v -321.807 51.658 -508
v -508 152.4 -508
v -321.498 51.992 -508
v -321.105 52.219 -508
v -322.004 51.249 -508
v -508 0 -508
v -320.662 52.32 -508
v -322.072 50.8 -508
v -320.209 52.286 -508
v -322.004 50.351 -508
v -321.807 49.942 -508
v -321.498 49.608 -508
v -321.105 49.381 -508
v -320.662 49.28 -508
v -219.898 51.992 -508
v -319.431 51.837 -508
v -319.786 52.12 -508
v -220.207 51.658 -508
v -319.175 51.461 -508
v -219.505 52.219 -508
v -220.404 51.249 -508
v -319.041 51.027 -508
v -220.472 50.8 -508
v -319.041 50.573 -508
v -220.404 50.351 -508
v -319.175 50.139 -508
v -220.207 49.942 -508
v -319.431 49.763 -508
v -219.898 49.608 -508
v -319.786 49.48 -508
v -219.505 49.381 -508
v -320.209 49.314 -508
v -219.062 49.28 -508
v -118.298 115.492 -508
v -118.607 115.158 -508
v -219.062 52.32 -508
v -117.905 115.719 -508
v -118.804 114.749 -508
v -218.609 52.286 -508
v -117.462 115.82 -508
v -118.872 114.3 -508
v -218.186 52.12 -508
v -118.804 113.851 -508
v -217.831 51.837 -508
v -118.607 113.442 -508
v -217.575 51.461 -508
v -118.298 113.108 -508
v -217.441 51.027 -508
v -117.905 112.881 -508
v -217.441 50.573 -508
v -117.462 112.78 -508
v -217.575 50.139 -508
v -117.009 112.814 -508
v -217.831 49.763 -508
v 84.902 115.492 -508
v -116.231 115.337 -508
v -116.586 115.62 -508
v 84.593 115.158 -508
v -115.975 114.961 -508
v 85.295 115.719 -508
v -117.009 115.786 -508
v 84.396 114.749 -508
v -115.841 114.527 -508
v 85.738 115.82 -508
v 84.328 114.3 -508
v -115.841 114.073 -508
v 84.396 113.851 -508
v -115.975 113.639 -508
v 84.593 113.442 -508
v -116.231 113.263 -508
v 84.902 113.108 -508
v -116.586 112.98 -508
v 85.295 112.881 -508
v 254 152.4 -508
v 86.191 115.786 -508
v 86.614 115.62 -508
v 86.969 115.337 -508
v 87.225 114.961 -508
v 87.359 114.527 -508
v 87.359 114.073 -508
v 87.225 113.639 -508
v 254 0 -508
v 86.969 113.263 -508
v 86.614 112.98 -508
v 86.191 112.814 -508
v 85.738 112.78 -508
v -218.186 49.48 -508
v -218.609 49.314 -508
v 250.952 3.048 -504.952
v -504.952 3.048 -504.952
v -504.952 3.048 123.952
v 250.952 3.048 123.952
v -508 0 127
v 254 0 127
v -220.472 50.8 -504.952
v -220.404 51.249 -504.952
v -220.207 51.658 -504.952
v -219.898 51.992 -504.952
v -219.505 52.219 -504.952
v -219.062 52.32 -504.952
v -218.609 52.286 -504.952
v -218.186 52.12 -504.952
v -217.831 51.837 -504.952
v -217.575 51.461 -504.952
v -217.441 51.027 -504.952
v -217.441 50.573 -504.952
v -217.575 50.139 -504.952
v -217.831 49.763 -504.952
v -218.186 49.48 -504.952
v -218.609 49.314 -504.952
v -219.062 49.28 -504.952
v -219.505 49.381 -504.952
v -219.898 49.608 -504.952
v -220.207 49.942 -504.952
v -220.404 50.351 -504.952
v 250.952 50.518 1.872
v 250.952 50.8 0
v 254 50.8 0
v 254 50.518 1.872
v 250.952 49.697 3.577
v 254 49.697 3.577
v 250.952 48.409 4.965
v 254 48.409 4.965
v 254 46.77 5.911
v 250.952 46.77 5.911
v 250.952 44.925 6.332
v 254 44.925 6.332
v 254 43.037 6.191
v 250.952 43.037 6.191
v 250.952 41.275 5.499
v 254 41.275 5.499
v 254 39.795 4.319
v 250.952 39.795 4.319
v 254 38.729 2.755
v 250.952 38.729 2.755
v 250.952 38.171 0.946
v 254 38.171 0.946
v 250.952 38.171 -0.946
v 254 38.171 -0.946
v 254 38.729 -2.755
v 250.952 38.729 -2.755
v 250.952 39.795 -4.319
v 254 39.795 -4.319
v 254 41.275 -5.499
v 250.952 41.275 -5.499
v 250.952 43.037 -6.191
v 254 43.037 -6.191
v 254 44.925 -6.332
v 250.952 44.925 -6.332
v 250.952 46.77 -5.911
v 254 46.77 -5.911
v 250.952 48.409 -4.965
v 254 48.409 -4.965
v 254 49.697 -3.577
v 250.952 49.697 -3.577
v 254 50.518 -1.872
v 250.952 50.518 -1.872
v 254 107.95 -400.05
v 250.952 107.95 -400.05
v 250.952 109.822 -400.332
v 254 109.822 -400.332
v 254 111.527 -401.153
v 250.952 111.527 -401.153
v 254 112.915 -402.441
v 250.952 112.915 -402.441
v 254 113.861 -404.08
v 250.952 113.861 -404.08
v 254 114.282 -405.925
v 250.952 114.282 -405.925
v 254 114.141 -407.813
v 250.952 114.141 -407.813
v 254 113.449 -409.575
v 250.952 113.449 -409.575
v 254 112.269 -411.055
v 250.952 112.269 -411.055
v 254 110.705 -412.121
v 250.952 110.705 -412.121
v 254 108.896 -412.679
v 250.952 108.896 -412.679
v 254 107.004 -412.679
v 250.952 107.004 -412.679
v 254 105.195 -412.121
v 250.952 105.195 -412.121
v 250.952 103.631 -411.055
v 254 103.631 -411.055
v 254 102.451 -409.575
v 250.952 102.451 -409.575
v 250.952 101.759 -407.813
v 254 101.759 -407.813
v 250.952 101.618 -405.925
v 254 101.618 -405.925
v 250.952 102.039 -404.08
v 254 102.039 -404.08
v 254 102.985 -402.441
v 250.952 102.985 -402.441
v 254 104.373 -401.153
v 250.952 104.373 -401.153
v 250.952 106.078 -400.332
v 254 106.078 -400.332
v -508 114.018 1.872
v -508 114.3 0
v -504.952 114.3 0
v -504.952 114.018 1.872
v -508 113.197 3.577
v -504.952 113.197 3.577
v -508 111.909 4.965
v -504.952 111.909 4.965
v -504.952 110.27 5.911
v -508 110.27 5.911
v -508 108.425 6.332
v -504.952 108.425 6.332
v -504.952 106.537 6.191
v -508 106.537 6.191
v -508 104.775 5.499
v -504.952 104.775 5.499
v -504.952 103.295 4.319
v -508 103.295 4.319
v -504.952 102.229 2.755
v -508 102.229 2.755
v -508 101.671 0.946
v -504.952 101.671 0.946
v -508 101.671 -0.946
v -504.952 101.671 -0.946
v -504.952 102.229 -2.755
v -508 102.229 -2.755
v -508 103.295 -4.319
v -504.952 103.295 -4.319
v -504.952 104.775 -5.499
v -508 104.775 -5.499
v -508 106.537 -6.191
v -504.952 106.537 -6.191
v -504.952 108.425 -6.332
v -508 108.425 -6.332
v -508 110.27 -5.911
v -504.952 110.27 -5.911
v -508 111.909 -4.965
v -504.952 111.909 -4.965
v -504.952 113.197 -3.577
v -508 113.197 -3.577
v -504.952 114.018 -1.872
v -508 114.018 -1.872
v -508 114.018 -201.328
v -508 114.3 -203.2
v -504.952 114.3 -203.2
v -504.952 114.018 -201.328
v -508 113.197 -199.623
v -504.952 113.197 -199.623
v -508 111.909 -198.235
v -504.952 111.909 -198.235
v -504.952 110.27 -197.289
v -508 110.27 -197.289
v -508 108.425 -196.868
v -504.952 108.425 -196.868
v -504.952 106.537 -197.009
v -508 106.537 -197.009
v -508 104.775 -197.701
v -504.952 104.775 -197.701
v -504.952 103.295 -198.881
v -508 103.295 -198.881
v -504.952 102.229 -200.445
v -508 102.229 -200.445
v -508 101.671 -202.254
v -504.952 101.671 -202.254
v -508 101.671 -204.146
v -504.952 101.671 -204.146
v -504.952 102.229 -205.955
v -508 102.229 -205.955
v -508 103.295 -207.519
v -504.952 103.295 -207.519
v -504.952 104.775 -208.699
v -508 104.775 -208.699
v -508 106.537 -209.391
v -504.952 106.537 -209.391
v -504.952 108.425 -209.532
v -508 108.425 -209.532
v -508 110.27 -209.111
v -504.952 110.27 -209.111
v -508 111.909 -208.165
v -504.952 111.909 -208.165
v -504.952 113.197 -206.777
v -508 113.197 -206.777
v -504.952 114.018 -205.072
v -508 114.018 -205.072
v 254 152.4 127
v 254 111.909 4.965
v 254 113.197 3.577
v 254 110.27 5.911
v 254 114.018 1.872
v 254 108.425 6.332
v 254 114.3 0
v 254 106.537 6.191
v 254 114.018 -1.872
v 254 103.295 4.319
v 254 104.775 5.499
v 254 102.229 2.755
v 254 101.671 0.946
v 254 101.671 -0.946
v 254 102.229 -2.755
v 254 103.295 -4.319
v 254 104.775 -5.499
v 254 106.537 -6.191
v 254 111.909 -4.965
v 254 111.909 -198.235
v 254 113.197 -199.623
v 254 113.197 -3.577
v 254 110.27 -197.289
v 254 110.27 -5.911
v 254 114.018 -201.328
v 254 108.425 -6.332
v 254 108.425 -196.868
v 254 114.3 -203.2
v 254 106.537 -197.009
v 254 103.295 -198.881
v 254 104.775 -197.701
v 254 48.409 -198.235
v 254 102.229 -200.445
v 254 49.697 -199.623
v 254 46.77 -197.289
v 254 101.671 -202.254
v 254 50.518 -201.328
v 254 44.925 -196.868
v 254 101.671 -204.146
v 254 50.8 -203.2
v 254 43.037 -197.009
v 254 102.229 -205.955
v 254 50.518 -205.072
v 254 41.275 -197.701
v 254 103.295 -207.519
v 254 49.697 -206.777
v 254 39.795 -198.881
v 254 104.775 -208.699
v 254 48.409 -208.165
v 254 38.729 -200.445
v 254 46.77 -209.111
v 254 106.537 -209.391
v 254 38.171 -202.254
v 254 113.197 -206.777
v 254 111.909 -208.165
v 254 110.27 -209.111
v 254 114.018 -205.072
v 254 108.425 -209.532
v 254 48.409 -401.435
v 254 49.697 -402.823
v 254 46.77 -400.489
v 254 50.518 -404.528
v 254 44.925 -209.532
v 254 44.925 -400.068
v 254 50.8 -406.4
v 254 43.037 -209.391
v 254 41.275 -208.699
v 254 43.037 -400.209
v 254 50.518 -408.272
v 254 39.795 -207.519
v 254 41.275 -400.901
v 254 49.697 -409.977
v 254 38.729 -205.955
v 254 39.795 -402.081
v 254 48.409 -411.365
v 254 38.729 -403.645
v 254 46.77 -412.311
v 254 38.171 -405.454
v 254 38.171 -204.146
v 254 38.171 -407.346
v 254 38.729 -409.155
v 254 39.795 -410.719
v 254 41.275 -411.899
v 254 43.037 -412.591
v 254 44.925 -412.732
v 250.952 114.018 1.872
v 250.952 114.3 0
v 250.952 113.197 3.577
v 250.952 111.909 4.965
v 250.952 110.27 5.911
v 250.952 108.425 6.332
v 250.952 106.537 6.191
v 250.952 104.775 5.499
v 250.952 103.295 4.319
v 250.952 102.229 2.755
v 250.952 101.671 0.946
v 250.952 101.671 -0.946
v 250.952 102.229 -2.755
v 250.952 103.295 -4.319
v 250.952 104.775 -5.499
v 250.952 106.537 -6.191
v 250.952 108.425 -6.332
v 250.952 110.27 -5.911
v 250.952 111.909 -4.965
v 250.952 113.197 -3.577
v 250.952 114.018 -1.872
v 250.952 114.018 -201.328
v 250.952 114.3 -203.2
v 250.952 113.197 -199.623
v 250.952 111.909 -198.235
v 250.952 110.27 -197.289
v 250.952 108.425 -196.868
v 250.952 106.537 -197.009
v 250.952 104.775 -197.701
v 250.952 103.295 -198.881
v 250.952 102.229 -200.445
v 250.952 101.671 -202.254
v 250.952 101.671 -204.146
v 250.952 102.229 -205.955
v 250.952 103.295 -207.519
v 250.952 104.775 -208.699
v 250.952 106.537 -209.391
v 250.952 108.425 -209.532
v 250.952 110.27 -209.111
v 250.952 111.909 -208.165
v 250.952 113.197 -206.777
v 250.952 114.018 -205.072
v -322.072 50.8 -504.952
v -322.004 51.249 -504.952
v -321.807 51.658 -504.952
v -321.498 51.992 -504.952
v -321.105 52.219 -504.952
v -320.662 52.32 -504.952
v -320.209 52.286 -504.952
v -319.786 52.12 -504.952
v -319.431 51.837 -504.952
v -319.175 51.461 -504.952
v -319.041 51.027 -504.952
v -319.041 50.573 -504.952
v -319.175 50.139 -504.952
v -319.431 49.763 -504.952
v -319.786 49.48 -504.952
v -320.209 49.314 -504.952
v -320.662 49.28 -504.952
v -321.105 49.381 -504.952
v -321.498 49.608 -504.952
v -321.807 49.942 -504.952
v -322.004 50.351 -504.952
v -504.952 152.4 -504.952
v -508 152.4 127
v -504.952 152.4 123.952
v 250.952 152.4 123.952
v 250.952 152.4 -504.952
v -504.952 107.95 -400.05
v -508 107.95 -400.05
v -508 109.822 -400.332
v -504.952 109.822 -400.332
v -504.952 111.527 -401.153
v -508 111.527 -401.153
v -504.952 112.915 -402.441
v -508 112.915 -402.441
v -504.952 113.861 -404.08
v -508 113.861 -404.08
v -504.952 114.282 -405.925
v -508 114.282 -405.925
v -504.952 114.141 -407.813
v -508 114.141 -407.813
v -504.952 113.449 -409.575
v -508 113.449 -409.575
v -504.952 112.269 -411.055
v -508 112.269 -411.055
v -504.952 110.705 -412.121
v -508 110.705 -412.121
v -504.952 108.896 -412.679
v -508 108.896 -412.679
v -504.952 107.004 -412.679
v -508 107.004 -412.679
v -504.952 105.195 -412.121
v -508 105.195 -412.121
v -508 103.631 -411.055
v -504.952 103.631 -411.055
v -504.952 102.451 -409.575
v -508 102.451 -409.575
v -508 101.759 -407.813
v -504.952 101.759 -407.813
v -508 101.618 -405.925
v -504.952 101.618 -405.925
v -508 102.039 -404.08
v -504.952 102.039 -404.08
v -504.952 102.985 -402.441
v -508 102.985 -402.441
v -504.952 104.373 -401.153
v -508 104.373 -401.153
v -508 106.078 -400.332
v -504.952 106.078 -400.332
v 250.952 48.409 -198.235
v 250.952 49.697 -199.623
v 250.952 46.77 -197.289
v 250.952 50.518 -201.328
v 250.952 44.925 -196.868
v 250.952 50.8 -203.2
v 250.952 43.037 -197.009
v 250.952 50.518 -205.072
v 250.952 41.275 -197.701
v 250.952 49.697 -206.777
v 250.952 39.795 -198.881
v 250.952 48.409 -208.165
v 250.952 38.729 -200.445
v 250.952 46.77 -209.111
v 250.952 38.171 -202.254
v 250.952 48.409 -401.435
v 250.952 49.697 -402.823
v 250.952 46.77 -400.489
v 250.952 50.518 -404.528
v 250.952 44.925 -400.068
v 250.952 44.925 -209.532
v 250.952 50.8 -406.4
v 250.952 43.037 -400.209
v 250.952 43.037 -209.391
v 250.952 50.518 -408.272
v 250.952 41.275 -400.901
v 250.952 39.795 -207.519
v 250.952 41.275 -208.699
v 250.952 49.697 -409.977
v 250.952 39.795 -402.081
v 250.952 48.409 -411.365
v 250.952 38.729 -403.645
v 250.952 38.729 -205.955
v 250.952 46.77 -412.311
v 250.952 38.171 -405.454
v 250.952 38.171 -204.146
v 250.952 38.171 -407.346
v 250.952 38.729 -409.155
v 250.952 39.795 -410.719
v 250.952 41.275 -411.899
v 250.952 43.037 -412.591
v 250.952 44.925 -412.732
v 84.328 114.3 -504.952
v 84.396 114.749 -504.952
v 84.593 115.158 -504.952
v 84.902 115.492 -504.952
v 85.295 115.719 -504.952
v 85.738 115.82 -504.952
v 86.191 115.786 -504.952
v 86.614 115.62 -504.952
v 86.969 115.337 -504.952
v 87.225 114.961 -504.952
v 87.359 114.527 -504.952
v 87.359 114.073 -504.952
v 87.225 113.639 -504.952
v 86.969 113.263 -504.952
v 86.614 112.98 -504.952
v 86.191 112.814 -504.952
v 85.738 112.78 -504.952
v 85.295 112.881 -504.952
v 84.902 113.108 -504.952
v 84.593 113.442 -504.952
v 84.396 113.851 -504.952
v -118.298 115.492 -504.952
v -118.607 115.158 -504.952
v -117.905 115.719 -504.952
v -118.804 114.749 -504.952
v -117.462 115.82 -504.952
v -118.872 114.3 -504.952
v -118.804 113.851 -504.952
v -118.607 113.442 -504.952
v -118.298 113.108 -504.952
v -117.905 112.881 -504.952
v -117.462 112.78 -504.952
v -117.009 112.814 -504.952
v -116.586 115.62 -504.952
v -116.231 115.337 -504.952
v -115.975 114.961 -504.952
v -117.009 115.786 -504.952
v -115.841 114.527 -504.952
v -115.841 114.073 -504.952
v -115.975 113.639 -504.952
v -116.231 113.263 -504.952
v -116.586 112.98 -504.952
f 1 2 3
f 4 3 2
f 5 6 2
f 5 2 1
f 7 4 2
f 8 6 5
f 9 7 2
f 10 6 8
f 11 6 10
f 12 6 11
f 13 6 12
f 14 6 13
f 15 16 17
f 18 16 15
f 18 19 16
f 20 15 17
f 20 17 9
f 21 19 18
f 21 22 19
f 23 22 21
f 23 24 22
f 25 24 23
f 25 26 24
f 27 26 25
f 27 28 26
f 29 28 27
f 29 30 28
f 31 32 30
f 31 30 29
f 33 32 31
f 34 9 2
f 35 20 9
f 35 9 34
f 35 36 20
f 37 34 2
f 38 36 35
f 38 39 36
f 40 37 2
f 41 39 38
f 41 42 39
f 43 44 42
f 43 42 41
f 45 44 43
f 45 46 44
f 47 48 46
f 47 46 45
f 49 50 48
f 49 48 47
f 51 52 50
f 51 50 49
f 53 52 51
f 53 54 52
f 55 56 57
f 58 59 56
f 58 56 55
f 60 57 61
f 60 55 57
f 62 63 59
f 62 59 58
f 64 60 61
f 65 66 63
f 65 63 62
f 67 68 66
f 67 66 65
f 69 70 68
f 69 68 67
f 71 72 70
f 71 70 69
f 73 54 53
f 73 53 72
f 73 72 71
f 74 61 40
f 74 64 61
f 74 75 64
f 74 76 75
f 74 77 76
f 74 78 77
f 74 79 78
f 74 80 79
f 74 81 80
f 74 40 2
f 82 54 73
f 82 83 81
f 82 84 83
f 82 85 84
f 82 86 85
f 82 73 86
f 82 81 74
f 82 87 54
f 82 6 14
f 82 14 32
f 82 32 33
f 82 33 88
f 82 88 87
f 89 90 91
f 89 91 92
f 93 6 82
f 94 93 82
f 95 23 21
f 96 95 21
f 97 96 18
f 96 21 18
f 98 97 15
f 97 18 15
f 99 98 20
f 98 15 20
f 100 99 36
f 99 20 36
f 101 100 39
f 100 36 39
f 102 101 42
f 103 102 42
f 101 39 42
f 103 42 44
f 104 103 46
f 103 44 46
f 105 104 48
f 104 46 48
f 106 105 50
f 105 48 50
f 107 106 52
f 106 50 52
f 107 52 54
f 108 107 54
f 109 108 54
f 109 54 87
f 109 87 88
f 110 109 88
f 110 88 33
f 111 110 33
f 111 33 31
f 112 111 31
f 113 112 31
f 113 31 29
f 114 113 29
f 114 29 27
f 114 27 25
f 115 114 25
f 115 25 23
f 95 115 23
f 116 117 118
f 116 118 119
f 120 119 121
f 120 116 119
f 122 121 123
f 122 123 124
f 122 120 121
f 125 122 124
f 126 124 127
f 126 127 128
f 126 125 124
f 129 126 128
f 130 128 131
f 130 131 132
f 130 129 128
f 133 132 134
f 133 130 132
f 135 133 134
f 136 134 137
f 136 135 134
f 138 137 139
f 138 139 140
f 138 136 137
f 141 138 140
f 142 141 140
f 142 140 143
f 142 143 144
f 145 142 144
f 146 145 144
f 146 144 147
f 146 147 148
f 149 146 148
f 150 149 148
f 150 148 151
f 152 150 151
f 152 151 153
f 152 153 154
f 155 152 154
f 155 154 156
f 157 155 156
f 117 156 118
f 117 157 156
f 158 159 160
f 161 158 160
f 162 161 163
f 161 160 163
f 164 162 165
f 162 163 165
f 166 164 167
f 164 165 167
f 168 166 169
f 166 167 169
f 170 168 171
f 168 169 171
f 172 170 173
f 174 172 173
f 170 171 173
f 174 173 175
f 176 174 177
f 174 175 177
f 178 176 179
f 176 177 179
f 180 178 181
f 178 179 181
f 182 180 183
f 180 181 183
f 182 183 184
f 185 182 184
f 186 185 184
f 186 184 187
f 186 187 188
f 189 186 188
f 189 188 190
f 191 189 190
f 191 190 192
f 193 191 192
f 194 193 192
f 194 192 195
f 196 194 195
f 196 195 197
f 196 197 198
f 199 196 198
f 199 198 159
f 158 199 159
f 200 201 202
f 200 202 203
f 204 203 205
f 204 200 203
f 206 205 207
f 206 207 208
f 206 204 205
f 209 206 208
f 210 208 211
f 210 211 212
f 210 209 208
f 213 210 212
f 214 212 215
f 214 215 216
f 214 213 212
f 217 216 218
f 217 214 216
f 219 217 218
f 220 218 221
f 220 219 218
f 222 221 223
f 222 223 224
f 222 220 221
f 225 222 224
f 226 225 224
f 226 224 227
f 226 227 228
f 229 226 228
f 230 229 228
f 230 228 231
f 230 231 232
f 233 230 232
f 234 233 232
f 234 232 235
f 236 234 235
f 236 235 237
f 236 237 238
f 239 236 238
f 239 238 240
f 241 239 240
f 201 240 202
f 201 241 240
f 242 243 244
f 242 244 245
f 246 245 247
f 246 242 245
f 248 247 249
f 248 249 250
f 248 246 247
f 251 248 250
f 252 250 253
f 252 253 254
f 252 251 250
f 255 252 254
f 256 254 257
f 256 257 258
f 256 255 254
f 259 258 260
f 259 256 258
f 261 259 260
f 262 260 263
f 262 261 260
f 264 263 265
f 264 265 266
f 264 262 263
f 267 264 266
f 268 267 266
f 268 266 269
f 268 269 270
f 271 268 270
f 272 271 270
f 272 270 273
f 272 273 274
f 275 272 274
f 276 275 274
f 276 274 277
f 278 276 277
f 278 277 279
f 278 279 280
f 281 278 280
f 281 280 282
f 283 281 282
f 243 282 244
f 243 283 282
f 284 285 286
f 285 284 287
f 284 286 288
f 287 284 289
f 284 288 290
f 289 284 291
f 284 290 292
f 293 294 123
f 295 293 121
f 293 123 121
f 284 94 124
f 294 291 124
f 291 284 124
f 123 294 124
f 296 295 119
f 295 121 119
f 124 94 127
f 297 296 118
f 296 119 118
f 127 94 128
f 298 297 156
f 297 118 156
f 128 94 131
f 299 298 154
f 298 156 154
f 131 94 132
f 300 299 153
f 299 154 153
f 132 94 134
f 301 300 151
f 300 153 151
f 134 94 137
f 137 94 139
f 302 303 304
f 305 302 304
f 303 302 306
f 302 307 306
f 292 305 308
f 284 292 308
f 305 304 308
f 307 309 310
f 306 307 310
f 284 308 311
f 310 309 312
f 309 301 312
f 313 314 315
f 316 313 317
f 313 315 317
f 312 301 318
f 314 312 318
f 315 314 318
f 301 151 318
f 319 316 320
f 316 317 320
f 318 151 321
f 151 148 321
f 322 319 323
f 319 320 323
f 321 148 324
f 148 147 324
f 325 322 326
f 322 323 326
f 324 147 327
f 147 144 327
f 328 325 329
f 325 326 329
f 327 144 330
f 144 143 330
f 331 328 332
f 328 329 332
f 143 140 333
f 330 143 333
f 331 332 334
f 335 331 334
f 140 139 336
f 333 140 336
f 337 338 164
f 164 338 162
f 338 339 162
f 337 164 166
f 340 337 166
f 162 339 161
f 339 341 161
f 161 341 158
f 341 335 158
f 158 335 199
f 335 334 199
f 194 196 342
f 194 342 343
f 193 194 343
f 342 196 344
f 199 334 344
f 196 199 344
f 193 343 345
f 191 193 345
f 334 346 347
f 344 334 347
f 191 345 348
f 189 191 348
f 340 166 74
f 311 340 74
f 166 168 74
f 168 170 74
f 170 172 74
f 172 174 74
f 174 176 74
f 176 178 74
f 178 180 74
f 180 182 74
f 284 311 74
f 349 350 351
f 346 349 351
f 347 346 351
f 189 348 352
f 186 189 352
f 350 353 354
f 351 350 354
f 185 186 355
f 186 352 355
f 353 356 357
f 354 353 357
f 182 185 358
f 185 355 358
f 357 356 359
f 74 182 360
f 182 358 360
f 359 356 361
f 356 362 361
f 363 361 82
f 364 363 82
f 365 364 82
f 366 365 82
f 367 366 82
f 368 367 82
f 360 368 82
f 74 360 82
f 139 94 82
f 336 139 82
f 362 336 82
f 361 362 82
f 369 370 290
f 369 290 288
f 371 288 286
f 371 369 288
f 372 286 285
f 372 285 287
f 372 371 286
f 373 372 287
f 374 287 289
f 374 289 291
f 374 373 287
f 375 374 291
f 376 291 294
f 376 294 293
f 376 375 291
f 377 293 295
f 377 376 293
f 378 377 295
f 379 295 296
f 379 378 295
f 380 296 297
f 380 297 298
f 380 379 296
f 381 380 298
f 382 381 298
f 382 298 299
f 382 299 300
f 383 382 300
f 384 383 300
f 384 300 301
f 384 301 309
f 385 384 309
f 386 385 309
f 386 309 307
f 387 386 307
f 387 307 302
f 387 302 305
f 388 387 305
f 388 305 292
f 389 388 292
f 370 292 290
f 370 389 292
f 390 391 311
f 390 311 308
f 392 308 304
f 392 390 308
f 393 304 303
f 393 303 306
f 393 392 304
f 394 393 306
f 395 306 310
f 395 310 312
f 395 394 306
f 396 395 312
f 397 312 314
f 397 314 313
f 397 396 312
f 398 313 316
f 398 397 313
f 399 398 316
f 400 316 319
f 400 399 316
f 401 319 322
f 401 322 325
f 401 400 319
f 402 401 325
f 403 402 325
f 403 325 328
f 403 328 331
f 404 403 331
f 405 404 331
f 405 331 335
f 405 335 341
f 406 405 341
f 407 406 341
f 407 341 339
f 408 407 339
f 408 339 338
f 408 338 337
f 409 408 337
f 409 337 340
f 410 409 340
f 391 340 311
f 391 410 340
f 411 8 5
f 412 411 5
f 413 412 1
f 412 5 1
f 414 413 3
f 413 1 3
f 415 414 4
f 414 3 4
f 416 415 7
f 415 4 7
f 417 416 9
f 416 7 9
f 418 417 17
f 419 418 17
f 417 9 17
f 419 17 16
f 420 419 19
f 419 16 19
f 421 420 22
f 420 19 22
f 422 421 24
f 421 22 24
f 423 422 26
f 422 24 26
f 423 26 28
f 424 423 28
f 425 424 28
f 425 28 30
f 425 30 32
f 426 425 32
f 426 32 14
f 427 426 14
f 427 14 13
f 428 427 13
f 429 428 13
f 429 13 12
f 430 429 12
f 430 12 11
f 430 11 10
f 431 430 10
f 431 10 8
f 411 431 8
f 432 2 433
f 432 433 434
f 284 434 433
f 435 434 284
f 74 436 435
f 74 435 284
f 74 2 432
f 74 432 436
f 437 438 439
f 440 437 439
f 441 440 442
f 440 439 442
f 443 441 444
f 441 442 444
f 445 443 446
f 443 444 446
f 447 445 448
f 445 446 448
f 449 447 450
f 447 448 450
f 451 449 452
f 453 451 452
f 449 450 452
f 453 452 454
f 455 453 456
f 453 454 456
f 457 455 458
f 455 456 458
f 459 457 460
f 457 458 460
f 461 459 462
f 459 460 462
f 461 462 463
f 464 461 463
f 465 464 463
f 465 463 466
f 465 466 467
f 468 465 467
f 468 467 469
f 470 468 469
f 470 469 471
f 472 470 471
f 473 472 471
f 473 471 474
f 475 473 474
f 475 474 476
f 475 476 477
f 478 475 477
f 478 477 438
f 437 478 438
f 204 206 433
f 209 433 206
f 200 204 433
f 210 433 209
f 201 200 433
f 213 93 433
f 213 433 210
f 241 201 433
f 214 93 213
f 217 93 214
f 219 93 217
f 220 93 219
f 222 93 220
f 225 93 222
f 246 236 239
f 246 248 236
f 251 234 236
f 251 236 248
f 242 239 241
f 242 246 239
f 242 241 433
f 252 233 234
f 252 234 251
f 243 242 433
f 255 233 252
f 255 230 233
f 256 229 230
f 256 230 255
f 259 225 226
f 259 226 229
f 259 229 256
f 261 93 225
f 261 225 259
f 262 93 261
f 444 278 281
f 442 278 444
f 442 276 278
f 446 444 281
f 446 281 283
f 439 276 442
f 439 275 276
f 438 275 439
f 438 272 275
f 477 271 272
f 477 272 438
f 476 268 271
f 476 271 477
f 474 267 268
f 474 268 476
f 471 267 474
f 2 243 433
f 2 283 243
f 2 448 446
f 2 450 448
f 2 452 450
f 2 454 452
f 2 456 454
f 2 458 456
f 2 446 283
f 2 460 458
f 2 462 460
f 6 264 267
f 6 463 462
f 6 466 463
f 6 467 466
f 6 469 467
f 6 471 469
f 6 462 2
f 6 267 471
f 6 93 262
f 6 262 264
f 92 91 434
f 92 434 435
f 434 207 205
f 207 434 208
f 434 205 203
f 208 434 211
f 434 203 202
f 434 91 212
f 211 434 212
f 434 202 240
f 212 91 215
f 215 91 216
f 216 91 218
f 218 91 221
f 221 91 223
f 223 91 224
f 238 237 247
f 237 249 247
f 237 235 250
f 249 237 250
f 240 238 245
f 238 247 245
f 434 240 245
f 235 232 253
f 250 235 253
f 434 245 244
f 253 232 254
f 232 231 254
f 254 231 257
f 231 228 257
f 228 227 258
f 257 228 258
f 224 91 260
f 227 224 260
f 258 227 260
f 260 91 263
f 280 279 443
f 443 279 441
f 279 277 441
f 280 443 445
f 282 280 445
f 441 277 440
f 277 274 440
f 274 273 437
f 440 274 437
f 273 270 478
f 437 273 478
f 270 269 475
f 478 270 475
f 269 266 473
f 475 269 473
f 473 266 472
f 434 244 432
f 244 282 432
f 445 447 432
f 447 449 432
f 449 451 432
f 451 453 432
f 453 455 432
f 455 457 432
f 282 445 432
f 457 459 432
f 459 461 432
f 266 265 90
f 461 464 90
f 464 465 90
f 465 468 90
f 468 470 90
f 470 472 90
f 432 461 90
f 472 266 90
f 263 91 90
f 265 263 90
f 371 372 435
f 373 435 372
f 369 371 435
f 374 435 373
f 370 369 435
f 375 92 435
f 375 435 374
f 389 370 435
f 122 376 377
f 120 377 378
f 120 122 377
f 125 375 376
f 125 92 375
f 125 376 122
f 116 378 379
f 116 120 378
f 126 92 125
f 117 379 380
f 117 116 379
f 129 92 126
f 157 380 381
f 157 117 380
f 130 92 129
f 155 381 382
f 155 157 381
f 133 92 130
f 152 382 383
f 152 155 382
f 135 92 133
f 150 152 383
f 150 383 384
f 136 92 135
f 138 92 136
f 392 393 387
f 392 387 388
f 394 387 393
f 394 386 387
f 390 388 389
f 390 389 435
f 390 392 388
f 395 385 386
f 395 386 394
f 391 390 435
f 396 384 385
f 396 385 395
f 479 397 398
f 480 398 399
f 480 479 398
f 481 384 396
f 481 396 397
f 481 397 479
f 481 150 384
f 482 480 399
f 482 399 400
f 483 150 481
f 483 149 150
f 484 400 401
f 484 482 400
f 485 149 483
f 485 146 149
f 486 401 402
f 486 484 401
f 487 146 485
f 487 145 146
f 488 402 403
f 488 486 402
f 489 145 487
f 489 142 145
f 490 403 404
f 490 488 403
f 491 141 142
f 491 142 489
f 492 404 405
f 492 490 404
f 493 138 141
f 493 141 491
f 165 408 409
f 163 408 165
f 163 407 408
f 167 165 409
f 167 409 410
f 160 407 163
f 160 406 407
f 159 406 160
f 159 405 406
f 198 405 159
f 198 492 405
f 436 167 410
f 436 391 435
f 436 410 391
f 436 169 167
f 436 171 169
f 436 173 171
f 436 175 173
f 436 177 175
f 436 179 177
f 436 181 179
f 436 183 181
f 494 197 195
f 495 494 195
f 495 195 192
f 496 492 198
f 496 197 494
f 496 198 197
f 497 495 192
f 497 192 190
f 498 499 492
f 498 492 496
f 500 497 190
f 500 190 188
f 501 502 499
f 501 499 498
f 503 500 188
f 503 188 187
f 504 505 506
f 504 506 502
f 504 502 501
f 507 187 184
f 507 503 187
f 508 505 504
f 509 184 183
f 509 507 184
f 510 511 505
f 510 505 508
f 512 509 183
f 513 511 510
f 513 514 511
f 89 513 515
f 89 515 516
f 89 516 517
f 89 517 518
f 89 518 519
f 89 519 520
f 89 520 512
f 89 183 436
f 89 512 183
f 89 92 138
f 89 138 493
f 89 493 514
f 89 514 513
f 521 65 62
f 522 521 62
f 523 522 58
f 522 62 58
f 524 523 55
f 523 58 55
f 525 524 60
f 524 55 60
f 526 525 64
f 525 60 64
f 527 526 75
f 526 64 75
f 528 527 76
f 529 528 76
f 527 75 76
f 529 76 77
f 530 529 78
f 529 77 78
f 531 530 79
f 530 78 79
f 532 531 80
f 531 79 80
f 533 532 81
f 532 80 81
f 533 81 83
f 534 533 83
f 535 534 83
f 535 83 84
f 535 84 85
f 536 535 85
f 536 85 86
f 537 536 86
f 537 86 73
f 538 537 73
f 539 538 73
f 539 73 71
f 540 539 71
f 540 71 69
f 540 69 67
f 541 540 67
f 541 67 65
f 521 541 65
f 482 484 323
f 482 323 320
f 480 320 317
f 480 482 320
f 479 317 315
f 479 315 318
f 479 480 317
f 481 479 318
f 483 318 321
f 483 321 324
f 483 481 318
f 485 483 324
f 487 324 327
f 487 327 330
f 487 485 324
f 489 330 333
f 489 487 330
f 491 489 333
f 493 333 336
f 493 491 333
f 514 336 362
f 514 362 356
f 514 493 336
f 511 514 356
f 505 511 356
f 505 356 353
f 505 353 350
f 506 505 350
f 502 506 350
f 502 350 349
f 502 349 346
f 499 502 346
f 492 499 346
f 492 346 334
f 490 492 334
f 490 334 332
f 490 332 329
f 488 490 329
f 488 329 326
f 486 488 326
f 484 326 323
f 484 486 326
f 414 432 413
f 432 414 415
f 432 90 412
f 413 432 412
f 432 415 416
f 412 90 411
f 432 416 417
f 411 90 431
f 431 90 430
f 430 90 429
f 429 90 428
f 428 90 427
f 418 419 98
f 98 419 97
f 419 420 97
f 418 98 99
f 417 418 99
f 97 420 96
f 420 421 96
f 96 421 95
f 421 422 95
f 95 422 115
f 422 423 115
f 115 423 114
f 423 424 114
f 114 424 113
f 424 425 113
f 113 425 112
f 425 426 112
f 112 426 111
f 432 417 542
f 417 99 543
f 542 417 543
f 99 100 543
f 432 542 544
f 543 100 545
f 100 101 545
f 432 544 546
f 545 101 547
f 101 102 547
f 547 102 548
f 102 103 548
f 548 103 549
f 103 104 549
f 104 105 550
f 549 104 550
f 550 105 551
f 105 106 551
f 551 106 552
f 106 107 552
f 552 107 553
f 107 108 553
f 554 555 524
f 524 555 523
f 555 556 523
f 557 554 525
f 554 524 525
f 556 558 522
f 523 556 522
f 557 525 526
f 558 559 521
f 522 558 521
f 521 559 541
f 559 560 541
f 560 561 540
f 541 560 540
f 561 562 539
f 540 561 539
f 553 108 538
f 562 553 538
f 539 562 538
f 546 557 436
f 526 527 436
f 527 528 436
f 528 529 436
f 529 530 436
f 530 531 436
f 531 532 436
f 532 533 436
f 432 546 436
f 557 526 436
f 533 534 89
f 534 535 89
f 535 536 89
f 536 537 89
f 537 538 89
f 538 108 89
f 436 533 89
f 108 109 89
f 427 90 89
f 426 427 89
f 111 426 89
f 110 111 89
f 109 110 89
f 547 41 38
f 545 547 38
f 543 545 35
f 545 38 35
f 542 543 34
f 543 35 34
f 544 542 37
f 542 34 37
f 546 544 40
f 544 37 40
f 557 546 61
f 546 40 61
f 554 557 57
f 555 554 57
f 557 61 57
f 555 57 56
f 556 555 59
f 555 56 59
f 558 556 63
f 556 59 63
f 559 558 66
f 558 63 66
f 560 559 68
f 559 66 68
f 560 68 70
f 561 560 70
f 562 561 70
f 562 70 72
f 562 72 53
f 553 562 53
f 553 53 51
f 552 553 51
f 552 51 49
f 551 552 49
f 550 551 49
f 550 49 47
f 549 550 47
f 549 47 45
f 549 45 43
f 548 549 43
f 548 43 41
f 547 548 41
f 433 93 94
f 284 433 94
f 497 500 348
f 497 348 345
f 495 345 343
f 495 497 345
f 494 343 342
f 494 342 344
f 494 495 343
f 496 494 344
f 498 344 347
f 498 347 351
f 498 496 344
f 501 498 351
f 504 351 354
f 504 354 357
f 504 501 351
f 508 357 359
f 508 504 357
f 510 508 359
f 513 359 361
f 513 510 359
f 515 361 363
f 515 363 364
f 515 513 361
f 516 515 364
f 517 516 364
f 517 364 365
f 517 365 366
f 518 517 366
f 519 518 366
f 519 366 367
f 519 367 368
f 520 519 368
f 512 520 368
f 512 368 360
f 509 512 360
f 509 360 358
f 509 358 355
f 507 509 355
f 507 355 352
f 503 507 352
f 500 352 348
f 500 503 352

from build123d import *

# Parameters (mm, degrees)
SKETCH1_W                          = 762
SKETCH1_H                          = 635
EXTRUDE1_DEPTH                     = 152.4
SHELL1_T                           = -3.048
SKETCH2_R                          = 6.35
CONNECTOR_MOUNT_CUT_EXTRUDE1_DEPTH = 929.403877631
LPATTERN1_START                    = -508
LPATTERN1_OUTLINE_R                = 6.35
LPATTERN1_DEPTH                    = 3.048
LPATTERN5_START                    = 250.952
LPATTERN5_OUTLINE_R                = 6.35
LPATTERN5_DEPTH                    = 3.048
SKETCH3_R                          = 1.524
CLIP_MOUNT_CUT_EXTRUDE2_DEPTH      = 39.624
LPATTERN2_COUNT                    = 5
LPATTERN2_PITCH                    = 101.6
LPATTERN2_COUNT_DIR2               = 2
LPATTERN2_PITCH_DIR2               = 63.5


# Read off the part's stored shape, not the designer's step: LPattern1, LPattern5
with BuildPart() as part:
    # Sketch1 → Extrude1 (new body)
    with BuildSketch(Plane(origin=(0, 0, 0), x_dir=(1, 0, 0), z_dir=(0, 1, 0))):
        with Locations((-127, 190.5)):
            Rectangle(SKETCH1_W, SKETCH1_H)
    extrude(amount=EXTRUDE1_DEPTH)

    # Shell1
    shell1_openings = [part.faces().sort_by_distance(p)[0] for p in [
        (-127, 152.4, -190.5),
    ]]
    offset(amount=SHELL1_T, openings=shell1_openings, kind=Kind.INTERSECTION)

    # Sketch2 → Connector mount--Cut-Extrude1 (cut, through all)
    with BuildSketch(Plane.ZY.offset(508)):
        with Locations((-406.4, 107.95)):
            Circle(SKETCH2_R)
    extrude(amount=-CONNECTOR_MOUNT_CUT_EXTRUDE1_DEPTH, mode=Mode.SUBTRACT)

    # LPattern1 outline → LPattern1 (cut)
    with BuildSketch(Plane.YZ.offset(LPATTERN1_START)):
        with Locations((107.95, 0)):
            Circle(LPATTERN1_OUTLINE_R)
        with Locations((107.95, -203.2)):
            Circle(LPATTERN1_OUTLINE_R)
    extrude(amount=LPATTERN1_DEPTH, mode=Mode.SUBTRACT)

    # LPattern5 outline → LPattern5 (cut)
    with BuildSketch(Plane.YZ.offset(LPATTERN5_START)):
        with Locations((44.45, 0)):
            Circle(LPATTERN5_OUTLINE_R)
        with Locations((44.45, -203.2)):
            Circle(LPATTERN5_OUTLINE_R)
        with Locations((44.45, -406.4)):
            Circle(LPATTERN5_OUTLINE_R)
        with Locations((107.95, 0)):
            Circle(LPATTERN5_OUTLINE_R)
        with Locations((107.95, -203.2)):
            Circle(LPATTERN5_OUTLINE_R)
    extrude(amount=LPATTERN5_DEPTH, mode=Mode.SUBTRACT)

    # Sketch3 → Clip Mount --Cut-Extrude2 (cut)
    with BuildSketch(Plane(origin=(0, 0, -508), x_dir=(-1, 0, 0), z_dir=(0, 0, -1))):
        with Locations((-85.852, 114.3)):
            Circle(SKETCH3_R)
    clip_mount_cut_extrude2 = extrude(amount=-CLIP_MOUNT_CUT_EXTRUDE2_DEPTH, mode=Mode.SUBTRACT)

    # LPattern2: Clip Mount --Cut-Extrude2 5 × 2, 6 skipped
    with Locations(*[(-i * LPATTERN2_PITCH, -j * LPATTERN2_PITCH_DIR2, 0) for i in range(LPATTERN2_COUNT) for j in range(LPATTERN2_COUNT_DIR2) if (i, j) not in ((0, 0), (0, 1), (1, 0), (1, 1), (2, 1), (3, 0), (4, 0))]):
        add(clip_mount_cut_extrude2, mode=Mode.SUBTRACT)


solid = part.part
